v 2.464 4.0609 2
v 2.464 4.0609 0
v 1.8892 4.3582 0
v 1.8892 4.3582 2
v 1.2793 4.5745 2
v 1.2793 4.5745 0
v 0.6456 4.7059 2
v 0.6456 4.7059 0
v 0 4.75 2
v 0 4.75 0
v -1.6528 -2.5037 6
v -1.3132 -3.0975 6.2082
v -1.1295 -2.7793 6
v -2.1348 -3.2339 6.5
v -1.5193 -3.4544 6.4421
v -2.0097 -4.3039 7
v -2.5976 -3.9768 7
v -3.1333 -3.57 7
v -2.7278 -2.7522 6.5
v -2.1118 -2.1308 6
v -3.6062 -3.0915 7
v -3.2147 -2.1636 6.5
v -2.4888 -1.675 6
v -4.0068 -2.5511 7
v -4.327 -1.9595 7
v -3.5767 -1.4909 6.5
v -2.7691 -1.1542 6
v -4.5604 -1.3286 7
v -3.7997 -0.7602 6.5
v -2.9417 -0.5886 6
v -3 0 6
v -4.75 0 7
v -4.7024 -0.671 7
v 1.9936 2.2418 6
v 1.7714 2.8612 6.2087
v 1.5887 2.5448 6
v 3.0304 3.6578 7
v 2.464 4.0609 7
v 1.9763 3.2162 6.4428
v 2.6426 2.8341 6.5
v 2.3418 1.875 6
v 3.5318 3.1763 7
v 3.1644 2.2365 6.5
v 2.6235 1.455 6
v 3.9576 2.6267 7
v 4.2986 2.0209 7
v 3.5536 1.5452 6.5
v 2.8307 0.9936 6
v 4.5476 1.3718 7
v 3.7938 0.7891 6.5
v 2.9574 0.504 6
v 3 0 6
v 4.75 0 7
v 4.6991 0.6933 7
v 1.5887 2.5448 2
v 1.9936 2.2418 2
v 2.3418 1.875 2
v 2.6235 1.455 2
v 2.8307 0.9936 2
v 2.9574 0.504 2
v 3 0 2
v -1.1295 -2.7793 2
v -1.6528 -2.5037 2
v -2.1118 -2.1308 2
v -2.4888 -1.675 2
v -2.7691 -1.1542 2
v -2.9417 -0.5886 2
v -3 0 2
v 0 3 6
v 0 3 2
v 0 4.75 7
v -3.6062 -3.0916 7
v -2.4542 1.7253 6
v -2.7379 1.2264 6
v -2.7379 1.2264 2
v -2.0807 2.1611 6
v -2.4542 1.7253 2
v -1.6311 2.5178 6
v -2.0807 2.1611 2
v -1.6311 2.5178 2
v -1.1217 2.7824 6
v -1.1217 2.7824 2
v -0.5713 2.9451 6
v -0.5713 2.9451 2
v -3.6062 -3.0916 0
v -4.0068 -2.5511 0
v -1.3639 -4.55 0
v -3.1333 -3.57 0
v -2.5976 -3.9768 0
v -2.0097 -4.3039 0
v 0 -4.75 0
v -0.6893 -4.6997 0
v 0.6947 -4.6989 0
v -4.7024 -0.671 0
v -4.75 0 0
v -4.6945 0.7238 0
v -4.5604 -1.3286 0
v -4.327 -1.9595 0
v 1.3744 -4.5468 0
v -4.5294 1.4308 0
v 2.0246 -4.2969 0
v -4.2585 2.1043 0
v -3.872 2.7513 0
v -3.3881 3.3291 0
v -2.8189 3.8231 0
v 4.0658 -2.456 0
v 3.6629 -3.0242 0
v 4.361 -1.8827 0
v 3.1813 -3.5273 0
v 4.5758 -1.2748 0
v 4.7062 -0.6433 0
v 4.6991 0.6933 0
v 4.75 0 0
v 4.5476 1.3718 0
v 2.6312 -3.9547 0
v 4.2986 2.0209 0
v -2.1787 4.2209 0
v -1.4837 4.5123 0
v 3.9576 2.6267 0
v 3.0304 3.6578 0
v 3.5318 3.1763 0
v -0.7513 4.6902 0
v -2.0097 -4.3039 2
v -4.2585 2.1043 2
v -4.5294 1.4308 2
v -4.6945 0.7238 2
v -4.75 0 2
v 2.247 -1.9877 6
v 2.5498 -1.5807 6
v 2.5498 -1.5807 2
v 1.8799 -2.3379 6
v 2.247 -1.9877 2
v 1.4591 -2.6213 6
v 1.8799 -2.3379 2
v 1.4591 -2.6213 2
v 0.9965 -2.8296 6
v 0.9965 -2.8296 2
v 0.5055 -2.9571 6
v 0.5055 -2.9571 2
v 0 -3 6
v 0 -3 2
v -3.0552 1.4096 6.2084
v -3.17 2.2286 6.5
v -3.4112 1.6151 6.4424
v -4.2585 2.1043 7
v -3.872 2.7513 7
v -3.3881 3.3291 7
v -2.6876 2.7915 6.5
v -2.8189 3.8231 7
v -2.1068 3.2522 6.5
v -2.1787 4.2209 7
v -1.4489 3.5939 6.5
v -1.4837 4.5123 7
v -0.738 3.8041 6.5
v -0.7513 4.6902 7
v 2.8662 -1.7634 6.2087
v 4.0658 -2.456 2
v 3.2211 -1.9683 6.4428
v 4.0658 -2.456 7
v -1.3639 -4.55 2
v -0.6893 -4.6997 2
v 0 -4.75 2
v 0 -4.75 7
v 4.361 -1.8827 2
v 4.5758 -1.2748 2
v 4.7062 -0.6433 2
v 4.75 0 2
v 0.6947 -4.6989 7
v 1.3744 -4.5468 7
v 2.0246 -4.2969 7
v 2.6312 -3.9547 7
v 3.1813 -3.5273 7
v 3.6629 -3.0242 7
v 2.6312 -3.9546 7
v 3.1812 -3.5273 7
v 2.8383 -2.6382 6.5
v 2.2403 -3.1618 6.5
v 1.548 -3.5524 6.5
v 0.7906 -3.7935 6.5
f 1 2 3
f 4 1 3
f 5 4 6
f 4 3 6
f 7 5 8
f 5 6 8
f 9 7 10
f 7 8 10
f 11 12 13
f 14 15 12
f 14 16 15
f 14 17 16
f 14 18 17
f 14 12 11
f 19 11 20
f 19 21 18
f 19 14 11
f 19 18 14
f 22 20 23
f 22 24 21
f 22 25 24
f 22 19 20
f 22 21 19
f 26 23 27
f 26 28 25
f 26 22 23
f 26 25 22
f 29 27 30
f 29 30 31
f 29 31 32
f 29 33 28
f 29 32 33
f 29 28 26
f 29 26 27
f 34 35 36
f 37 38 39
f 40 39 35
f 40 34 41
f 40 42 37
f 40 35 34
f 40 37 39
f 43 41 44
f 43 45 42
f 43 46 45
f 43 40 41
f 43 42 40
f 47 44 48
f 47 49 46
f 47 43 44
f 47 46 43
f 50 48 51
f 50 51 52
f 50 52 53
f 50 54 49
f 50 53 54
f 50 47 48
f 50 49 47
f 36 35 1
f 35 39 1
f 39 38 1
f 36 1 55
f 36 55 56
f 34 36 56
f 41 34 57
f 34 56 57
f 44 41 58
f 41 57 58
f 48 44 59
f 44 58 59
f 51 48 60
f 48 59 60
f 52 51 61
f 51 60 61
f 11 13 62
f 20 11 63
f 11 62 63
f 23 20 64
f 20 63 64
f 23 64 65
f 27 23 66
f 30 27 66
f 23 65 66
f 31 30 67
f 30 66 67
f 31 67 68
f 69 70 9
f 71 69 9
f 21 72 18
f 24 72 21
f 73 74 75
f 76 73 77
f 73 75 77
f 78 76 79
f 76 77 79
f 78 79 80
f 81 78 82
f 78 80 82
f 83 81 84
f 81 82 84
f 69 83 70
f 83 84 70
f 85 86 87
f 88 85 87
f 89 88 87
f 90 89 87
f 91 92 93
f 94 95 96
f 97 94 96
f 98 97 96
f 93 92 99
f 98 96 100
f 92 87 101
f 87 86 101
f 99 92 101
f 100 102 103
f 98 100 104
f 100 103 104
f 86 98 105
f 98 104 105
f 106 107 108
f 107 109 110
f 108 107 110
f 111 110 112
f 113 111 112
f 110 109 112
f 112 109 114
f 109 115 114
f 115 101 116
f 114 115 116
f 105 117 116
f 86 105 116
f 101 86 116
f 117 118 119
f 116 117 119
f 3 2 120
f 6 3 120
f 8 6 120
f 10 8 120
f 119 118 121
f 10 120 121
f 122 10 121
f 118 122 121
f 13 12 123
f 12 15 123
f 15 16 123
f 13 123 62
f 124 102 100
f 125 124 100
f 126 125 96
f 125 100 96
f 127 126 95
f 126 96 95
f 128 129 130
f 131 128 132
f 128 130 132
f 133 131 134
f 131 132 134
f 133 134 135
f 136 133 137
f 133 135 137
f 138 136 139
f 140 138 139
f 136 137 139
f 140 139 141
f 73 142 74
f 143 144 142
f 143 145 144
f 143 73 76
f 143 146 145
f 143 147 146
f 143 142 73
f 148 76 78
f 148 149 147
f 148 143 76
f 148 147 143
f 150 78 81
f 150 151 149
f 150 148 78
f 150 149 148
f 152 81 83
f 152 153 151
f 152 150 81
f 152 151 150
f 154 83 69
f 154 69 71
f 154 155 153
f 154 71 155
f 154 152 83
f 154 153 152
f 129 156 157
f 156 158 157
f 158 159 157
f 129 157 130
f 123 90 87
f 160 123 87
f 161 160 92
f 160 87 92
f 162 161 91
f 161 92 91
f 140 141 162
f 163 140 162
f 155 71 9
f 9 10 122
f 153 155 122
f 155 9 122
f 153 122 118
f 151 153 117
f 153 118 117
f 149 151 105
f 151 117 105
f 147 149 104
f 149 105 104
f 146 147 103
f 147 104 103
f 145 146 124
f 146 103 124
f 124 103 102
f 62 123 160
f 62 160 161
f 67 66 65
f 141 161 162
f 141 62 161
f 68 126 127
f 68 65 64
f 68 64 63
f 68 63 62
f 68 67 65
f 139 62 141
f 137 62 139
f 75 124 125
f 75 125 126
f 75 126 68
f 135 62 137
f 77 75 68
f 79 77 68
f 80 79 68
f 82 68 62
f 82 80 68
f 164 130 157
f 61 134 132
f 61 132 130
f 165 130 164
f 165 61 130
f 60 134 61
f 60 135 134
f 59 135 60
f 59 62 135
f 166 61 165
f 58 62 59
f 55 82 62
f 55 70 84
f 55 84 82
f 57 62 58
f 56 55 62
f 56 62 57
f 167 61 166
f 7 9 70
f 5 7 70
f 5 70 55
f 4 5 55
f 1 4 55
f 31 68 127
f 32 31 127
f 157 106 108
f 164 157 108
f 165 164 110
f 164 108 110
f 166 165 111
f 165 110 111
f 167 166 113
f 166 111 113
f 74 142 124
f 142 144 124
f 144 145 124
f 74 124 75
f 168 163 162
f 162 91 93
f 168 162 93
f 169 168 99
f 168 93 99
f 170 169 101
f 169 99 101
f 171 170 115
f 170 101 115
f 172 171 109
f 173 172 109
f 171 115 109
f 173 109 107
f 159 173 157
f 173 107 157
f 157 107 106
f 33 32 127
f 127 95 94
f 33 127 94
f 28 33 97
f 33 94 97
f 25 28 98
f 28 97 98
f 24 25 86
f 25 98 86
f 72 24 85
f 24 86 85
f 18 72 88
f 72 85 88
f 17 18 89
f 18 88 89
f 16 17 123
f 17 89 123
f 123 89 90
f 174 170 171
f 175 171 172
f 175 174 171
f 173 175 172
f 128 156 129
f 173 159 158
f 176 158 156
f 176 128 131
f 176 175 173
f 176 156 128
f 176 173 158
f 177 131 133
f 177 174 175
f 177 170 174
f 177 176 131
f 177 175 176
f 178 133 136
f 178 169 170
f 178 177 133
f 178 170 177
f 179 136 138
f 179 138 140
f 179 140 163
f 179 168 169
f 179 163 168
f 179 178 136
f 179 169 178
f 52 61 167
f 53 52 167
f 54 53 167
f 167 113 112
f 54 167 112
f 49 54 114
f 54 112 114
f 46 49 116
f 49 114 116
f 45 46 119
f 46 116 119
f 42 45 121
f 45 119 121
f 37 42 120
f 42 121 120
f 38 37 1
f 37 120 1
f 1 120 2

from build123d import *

# Parameters (mm, degrees)
F1_DEPTH   = 2
F2_DEPTH   = 7
F3_SIZE2   = 1.74999
F3_SIZE    = 0.99999
F3_2_SIZE2 = 1.74999
F3_2_SIZE  = 0.99999
F3_3_SIZE2 = 1.74999
F3_3_SIZE  = 0.99999
F3_4_SIZE2 = 1.74999
F3_4_SIZE  = 0.99999


# Not quite as in the source:
# - a fillet or chamfer is up to 0.001 mm smaller than in the source, because OpenCascade refuses the exact size


with BuildPart() as f1:
    # F0 (on Top) → F1 (new body)
    with BuildSketch(Plane.XY):
        with BuildLine():
            ThreePointArc((2.5497759502, -1.5807095255), (2.8852493697, -0.8217883394), (3, 0))
            ThreePointArc((3, 0), (2.6235481729, 1.4549896853), (1.5886700104, 2.544823687))
            ThreePointArc((1.5886700104, 2.544823687), (0.8262956308, 2.8839617769), (0, 3))
            ThreePointArc((0, 3), (-1.6310845521, 2.51784892), (-2.7378829853, 1.226375456))
            ThreePointArc((-2.7378829853, 1.226375456), (-2.9337389928, 0.6270370979), (-3, 0))
            ThreePointArc((-3, 0), (-2.488818496, -1.6750470125), (-1.1294783373, -2.7792586575))
            ThreePointArc((-1.1294783373, -2.7792586575), (-0.5754233343, -2.944297537), (0, -3))
            ThreePointArc((0, -3), (1.4590872872, -2.6212715022), (2.5497759502, -1.5807095255))
        make_face()
        with BuildLine():
            Line((0, -4.75), (0, -3))
            ThreePointArc((0, -3), (-0.5754233343, -2.944297537), (-1.1294783373, -2.7792586575))
            Line((-1.1294783373, -2.7792586575), (-2.0097266443, -4.3038934484))
            ThreePointArc((-2.0097266443, -4.3038934484), (-1.0293216504, -4.6371324048), (0, -4.75))
        make_face()
        with BuildLine():
            Line((4.75, 0), (3, 0))
            ThreePointArc((3, 0), (2.8852493697, -0.8217883394), (2.5497759502, -1.5807095255))
            Line((2.5497759502, -1.5807095255), (4.0657909798, -2.455981211))
            ThreePointArc((4.0657909798, -2.455981211), (4.5757516953, -1.2747534754), (4.75, 0))
        make_face()
        with BuildLine():
            ThreePointArc((-3, 0), (-2.9337389928, 0.6270370979), (-2.7378829853, 1.226375456))
            Line((-2.7378829853, 1.226375456), (-4.2584618162, 2.1042820533))
            ThreePointArc((-4.2584618162, 2.1042820533), (-4.625483414, 1.0804643384), (-4.75, 0))
            Line((-4.75, 0), (-3, 0))
        make_face()
        with BuildLine():
            ThreePointArc((0, 3), (0.8262956308, 2.8839617769), (1.5886700104, 2.544823687))
            Line((1.5886700104, 2.544823687), (2.4639985646, 4.0609372162))
            ThreePointArc((2.4639985646, 4.0609372162), (1.2792670212, 4.5744918722), (0, 4.75))
            Line((0, 4.75), (0, 3))
        make_face()
    extrude(amount=F1_DEPTH)

    # F0 (on Top) → F2 (join)
    with BuildSketch(Plane.XY):
        with BuildLine():
            Line((-2.0097266443, -4.3038934484), (-1.1294783373, -2.7792586575))
            ThreePointArc((-1.1294783373, -2.7792586575), (-2.488818496, -1.6750470125), (-3, 0))
            Line((-3, 0), (-4.75, 0))
            ThreePointArc((-4.75, 0), (-4.0067880877, -2.5511074497), (-2.0097266443, -4.3038934484))
        make_face()
        with BuildLine():
            Line((4.0657909798, -2.455981211), (2.5497759502, -1.5807095255))
            ThreePointArc((2.5497759502, -1.5807095255), (1.4590872872, -2.6212715022), (0, -3))
            Line((0, -3), (0, -4.75))
            ThreePointArc((0, -4.75), (2.334158226, -4.1369318795), (4.0657909798, -2.455981211))
        make_face()
        with BuildLine():
            ThreePointArc((1.5886700104, 2.544823687), (2.6235481729, 1.4549896853), (3, 0))
            Line((3, 0), (4.75, 0))
            ThreePointArc((4.75, 0), (4.1392326089, 2.3300758376), (2.4639985646, 4.0609372162))
            Line((2.4639985646, 4.0609372162), (1.5886700104, 2.544823687))
        make_face()
        with BuildLine():
            ThreePointArc((-2.7378829853, 1.226375456), (-1.6310845521, 2.51784892), (0, 3))
            Line((0, 3), (0, 4.75))
            ThreePointArc((0, 4.75), (-2.5067070278, 4.0347143488), (-4.2584618162, 2.1042820533))
            Line((-4.2584618162, 2.1042820533), (-2.7378829853, 1.226375456))
        make_face()
    extrude(amount=F2_DEPTH)

    # F3 (size 1 and 1.75 in the source; OpenCascade refuses exactly that, so slightly less here)
    f3_edges = [f1.edges().sort_by_distance(p)[0] for p in [
        (-2.488818, -1.675047, 7),
    ]]
    f3_side = f1.faces().sort_by_distance((-2.488818, -1.675047, 4.5))[0]
    chamfer(f3_edges, length=F3_SIZE, length2=F3_SIZE2, reference=f3_side)

    # F3#2 (size 1 and 1.75 in the source; OpenCascade refuses exactly that, so slightly less here)
    f3_2_edges = [f1.edges().sort_by_distance(p)[0] for p in [
        (-1.631085, 2.517849, 7),
    ]]
    f3_2_side = f1.faces().sort_by_distance((-1.631085, 2.517849, 4.5))[0]
    chamfer(f3_2_edges, length=F3_2_SIZE, length2=F3_2_SIZE2, reference=f3_2_side)

    # F3#3 (size 1 and 1.75 in the source; OpenCascade refuses exactly that, so slightly less here)
    f3_3_edges = [f1.edges().sort_by_distance(p)[0] for p in [
        (2.623548, 1.45499, 7),
    ]]
    f3_3_side = f1.faces().sort_by_distance((2.623548, 1.45499, 4.5))[0]
    chamfer(f3_3_edges, length=F3_3_SIZE, length2=F3_3_SIZE2, reference=f3_3_side)

    # F3#4 (size 1 and 1.75 in the source; OpenCascade refuses exactly that, so slightly less here)
    f3_4_edges = [f1.edges().sort_by_distance(p)[0] for p in [
        (1.459087, -2.621272, 7),
    ]]
    f3_4_side = f1.faces().sort_by_distance((1.459087, -2.621272, 4.5))[0]
    chamfer(f3_4_edges, length=F3_4_SIZE, length2=F3_4_SIZE2, reference=f3_4_side)


solid = f1.part
